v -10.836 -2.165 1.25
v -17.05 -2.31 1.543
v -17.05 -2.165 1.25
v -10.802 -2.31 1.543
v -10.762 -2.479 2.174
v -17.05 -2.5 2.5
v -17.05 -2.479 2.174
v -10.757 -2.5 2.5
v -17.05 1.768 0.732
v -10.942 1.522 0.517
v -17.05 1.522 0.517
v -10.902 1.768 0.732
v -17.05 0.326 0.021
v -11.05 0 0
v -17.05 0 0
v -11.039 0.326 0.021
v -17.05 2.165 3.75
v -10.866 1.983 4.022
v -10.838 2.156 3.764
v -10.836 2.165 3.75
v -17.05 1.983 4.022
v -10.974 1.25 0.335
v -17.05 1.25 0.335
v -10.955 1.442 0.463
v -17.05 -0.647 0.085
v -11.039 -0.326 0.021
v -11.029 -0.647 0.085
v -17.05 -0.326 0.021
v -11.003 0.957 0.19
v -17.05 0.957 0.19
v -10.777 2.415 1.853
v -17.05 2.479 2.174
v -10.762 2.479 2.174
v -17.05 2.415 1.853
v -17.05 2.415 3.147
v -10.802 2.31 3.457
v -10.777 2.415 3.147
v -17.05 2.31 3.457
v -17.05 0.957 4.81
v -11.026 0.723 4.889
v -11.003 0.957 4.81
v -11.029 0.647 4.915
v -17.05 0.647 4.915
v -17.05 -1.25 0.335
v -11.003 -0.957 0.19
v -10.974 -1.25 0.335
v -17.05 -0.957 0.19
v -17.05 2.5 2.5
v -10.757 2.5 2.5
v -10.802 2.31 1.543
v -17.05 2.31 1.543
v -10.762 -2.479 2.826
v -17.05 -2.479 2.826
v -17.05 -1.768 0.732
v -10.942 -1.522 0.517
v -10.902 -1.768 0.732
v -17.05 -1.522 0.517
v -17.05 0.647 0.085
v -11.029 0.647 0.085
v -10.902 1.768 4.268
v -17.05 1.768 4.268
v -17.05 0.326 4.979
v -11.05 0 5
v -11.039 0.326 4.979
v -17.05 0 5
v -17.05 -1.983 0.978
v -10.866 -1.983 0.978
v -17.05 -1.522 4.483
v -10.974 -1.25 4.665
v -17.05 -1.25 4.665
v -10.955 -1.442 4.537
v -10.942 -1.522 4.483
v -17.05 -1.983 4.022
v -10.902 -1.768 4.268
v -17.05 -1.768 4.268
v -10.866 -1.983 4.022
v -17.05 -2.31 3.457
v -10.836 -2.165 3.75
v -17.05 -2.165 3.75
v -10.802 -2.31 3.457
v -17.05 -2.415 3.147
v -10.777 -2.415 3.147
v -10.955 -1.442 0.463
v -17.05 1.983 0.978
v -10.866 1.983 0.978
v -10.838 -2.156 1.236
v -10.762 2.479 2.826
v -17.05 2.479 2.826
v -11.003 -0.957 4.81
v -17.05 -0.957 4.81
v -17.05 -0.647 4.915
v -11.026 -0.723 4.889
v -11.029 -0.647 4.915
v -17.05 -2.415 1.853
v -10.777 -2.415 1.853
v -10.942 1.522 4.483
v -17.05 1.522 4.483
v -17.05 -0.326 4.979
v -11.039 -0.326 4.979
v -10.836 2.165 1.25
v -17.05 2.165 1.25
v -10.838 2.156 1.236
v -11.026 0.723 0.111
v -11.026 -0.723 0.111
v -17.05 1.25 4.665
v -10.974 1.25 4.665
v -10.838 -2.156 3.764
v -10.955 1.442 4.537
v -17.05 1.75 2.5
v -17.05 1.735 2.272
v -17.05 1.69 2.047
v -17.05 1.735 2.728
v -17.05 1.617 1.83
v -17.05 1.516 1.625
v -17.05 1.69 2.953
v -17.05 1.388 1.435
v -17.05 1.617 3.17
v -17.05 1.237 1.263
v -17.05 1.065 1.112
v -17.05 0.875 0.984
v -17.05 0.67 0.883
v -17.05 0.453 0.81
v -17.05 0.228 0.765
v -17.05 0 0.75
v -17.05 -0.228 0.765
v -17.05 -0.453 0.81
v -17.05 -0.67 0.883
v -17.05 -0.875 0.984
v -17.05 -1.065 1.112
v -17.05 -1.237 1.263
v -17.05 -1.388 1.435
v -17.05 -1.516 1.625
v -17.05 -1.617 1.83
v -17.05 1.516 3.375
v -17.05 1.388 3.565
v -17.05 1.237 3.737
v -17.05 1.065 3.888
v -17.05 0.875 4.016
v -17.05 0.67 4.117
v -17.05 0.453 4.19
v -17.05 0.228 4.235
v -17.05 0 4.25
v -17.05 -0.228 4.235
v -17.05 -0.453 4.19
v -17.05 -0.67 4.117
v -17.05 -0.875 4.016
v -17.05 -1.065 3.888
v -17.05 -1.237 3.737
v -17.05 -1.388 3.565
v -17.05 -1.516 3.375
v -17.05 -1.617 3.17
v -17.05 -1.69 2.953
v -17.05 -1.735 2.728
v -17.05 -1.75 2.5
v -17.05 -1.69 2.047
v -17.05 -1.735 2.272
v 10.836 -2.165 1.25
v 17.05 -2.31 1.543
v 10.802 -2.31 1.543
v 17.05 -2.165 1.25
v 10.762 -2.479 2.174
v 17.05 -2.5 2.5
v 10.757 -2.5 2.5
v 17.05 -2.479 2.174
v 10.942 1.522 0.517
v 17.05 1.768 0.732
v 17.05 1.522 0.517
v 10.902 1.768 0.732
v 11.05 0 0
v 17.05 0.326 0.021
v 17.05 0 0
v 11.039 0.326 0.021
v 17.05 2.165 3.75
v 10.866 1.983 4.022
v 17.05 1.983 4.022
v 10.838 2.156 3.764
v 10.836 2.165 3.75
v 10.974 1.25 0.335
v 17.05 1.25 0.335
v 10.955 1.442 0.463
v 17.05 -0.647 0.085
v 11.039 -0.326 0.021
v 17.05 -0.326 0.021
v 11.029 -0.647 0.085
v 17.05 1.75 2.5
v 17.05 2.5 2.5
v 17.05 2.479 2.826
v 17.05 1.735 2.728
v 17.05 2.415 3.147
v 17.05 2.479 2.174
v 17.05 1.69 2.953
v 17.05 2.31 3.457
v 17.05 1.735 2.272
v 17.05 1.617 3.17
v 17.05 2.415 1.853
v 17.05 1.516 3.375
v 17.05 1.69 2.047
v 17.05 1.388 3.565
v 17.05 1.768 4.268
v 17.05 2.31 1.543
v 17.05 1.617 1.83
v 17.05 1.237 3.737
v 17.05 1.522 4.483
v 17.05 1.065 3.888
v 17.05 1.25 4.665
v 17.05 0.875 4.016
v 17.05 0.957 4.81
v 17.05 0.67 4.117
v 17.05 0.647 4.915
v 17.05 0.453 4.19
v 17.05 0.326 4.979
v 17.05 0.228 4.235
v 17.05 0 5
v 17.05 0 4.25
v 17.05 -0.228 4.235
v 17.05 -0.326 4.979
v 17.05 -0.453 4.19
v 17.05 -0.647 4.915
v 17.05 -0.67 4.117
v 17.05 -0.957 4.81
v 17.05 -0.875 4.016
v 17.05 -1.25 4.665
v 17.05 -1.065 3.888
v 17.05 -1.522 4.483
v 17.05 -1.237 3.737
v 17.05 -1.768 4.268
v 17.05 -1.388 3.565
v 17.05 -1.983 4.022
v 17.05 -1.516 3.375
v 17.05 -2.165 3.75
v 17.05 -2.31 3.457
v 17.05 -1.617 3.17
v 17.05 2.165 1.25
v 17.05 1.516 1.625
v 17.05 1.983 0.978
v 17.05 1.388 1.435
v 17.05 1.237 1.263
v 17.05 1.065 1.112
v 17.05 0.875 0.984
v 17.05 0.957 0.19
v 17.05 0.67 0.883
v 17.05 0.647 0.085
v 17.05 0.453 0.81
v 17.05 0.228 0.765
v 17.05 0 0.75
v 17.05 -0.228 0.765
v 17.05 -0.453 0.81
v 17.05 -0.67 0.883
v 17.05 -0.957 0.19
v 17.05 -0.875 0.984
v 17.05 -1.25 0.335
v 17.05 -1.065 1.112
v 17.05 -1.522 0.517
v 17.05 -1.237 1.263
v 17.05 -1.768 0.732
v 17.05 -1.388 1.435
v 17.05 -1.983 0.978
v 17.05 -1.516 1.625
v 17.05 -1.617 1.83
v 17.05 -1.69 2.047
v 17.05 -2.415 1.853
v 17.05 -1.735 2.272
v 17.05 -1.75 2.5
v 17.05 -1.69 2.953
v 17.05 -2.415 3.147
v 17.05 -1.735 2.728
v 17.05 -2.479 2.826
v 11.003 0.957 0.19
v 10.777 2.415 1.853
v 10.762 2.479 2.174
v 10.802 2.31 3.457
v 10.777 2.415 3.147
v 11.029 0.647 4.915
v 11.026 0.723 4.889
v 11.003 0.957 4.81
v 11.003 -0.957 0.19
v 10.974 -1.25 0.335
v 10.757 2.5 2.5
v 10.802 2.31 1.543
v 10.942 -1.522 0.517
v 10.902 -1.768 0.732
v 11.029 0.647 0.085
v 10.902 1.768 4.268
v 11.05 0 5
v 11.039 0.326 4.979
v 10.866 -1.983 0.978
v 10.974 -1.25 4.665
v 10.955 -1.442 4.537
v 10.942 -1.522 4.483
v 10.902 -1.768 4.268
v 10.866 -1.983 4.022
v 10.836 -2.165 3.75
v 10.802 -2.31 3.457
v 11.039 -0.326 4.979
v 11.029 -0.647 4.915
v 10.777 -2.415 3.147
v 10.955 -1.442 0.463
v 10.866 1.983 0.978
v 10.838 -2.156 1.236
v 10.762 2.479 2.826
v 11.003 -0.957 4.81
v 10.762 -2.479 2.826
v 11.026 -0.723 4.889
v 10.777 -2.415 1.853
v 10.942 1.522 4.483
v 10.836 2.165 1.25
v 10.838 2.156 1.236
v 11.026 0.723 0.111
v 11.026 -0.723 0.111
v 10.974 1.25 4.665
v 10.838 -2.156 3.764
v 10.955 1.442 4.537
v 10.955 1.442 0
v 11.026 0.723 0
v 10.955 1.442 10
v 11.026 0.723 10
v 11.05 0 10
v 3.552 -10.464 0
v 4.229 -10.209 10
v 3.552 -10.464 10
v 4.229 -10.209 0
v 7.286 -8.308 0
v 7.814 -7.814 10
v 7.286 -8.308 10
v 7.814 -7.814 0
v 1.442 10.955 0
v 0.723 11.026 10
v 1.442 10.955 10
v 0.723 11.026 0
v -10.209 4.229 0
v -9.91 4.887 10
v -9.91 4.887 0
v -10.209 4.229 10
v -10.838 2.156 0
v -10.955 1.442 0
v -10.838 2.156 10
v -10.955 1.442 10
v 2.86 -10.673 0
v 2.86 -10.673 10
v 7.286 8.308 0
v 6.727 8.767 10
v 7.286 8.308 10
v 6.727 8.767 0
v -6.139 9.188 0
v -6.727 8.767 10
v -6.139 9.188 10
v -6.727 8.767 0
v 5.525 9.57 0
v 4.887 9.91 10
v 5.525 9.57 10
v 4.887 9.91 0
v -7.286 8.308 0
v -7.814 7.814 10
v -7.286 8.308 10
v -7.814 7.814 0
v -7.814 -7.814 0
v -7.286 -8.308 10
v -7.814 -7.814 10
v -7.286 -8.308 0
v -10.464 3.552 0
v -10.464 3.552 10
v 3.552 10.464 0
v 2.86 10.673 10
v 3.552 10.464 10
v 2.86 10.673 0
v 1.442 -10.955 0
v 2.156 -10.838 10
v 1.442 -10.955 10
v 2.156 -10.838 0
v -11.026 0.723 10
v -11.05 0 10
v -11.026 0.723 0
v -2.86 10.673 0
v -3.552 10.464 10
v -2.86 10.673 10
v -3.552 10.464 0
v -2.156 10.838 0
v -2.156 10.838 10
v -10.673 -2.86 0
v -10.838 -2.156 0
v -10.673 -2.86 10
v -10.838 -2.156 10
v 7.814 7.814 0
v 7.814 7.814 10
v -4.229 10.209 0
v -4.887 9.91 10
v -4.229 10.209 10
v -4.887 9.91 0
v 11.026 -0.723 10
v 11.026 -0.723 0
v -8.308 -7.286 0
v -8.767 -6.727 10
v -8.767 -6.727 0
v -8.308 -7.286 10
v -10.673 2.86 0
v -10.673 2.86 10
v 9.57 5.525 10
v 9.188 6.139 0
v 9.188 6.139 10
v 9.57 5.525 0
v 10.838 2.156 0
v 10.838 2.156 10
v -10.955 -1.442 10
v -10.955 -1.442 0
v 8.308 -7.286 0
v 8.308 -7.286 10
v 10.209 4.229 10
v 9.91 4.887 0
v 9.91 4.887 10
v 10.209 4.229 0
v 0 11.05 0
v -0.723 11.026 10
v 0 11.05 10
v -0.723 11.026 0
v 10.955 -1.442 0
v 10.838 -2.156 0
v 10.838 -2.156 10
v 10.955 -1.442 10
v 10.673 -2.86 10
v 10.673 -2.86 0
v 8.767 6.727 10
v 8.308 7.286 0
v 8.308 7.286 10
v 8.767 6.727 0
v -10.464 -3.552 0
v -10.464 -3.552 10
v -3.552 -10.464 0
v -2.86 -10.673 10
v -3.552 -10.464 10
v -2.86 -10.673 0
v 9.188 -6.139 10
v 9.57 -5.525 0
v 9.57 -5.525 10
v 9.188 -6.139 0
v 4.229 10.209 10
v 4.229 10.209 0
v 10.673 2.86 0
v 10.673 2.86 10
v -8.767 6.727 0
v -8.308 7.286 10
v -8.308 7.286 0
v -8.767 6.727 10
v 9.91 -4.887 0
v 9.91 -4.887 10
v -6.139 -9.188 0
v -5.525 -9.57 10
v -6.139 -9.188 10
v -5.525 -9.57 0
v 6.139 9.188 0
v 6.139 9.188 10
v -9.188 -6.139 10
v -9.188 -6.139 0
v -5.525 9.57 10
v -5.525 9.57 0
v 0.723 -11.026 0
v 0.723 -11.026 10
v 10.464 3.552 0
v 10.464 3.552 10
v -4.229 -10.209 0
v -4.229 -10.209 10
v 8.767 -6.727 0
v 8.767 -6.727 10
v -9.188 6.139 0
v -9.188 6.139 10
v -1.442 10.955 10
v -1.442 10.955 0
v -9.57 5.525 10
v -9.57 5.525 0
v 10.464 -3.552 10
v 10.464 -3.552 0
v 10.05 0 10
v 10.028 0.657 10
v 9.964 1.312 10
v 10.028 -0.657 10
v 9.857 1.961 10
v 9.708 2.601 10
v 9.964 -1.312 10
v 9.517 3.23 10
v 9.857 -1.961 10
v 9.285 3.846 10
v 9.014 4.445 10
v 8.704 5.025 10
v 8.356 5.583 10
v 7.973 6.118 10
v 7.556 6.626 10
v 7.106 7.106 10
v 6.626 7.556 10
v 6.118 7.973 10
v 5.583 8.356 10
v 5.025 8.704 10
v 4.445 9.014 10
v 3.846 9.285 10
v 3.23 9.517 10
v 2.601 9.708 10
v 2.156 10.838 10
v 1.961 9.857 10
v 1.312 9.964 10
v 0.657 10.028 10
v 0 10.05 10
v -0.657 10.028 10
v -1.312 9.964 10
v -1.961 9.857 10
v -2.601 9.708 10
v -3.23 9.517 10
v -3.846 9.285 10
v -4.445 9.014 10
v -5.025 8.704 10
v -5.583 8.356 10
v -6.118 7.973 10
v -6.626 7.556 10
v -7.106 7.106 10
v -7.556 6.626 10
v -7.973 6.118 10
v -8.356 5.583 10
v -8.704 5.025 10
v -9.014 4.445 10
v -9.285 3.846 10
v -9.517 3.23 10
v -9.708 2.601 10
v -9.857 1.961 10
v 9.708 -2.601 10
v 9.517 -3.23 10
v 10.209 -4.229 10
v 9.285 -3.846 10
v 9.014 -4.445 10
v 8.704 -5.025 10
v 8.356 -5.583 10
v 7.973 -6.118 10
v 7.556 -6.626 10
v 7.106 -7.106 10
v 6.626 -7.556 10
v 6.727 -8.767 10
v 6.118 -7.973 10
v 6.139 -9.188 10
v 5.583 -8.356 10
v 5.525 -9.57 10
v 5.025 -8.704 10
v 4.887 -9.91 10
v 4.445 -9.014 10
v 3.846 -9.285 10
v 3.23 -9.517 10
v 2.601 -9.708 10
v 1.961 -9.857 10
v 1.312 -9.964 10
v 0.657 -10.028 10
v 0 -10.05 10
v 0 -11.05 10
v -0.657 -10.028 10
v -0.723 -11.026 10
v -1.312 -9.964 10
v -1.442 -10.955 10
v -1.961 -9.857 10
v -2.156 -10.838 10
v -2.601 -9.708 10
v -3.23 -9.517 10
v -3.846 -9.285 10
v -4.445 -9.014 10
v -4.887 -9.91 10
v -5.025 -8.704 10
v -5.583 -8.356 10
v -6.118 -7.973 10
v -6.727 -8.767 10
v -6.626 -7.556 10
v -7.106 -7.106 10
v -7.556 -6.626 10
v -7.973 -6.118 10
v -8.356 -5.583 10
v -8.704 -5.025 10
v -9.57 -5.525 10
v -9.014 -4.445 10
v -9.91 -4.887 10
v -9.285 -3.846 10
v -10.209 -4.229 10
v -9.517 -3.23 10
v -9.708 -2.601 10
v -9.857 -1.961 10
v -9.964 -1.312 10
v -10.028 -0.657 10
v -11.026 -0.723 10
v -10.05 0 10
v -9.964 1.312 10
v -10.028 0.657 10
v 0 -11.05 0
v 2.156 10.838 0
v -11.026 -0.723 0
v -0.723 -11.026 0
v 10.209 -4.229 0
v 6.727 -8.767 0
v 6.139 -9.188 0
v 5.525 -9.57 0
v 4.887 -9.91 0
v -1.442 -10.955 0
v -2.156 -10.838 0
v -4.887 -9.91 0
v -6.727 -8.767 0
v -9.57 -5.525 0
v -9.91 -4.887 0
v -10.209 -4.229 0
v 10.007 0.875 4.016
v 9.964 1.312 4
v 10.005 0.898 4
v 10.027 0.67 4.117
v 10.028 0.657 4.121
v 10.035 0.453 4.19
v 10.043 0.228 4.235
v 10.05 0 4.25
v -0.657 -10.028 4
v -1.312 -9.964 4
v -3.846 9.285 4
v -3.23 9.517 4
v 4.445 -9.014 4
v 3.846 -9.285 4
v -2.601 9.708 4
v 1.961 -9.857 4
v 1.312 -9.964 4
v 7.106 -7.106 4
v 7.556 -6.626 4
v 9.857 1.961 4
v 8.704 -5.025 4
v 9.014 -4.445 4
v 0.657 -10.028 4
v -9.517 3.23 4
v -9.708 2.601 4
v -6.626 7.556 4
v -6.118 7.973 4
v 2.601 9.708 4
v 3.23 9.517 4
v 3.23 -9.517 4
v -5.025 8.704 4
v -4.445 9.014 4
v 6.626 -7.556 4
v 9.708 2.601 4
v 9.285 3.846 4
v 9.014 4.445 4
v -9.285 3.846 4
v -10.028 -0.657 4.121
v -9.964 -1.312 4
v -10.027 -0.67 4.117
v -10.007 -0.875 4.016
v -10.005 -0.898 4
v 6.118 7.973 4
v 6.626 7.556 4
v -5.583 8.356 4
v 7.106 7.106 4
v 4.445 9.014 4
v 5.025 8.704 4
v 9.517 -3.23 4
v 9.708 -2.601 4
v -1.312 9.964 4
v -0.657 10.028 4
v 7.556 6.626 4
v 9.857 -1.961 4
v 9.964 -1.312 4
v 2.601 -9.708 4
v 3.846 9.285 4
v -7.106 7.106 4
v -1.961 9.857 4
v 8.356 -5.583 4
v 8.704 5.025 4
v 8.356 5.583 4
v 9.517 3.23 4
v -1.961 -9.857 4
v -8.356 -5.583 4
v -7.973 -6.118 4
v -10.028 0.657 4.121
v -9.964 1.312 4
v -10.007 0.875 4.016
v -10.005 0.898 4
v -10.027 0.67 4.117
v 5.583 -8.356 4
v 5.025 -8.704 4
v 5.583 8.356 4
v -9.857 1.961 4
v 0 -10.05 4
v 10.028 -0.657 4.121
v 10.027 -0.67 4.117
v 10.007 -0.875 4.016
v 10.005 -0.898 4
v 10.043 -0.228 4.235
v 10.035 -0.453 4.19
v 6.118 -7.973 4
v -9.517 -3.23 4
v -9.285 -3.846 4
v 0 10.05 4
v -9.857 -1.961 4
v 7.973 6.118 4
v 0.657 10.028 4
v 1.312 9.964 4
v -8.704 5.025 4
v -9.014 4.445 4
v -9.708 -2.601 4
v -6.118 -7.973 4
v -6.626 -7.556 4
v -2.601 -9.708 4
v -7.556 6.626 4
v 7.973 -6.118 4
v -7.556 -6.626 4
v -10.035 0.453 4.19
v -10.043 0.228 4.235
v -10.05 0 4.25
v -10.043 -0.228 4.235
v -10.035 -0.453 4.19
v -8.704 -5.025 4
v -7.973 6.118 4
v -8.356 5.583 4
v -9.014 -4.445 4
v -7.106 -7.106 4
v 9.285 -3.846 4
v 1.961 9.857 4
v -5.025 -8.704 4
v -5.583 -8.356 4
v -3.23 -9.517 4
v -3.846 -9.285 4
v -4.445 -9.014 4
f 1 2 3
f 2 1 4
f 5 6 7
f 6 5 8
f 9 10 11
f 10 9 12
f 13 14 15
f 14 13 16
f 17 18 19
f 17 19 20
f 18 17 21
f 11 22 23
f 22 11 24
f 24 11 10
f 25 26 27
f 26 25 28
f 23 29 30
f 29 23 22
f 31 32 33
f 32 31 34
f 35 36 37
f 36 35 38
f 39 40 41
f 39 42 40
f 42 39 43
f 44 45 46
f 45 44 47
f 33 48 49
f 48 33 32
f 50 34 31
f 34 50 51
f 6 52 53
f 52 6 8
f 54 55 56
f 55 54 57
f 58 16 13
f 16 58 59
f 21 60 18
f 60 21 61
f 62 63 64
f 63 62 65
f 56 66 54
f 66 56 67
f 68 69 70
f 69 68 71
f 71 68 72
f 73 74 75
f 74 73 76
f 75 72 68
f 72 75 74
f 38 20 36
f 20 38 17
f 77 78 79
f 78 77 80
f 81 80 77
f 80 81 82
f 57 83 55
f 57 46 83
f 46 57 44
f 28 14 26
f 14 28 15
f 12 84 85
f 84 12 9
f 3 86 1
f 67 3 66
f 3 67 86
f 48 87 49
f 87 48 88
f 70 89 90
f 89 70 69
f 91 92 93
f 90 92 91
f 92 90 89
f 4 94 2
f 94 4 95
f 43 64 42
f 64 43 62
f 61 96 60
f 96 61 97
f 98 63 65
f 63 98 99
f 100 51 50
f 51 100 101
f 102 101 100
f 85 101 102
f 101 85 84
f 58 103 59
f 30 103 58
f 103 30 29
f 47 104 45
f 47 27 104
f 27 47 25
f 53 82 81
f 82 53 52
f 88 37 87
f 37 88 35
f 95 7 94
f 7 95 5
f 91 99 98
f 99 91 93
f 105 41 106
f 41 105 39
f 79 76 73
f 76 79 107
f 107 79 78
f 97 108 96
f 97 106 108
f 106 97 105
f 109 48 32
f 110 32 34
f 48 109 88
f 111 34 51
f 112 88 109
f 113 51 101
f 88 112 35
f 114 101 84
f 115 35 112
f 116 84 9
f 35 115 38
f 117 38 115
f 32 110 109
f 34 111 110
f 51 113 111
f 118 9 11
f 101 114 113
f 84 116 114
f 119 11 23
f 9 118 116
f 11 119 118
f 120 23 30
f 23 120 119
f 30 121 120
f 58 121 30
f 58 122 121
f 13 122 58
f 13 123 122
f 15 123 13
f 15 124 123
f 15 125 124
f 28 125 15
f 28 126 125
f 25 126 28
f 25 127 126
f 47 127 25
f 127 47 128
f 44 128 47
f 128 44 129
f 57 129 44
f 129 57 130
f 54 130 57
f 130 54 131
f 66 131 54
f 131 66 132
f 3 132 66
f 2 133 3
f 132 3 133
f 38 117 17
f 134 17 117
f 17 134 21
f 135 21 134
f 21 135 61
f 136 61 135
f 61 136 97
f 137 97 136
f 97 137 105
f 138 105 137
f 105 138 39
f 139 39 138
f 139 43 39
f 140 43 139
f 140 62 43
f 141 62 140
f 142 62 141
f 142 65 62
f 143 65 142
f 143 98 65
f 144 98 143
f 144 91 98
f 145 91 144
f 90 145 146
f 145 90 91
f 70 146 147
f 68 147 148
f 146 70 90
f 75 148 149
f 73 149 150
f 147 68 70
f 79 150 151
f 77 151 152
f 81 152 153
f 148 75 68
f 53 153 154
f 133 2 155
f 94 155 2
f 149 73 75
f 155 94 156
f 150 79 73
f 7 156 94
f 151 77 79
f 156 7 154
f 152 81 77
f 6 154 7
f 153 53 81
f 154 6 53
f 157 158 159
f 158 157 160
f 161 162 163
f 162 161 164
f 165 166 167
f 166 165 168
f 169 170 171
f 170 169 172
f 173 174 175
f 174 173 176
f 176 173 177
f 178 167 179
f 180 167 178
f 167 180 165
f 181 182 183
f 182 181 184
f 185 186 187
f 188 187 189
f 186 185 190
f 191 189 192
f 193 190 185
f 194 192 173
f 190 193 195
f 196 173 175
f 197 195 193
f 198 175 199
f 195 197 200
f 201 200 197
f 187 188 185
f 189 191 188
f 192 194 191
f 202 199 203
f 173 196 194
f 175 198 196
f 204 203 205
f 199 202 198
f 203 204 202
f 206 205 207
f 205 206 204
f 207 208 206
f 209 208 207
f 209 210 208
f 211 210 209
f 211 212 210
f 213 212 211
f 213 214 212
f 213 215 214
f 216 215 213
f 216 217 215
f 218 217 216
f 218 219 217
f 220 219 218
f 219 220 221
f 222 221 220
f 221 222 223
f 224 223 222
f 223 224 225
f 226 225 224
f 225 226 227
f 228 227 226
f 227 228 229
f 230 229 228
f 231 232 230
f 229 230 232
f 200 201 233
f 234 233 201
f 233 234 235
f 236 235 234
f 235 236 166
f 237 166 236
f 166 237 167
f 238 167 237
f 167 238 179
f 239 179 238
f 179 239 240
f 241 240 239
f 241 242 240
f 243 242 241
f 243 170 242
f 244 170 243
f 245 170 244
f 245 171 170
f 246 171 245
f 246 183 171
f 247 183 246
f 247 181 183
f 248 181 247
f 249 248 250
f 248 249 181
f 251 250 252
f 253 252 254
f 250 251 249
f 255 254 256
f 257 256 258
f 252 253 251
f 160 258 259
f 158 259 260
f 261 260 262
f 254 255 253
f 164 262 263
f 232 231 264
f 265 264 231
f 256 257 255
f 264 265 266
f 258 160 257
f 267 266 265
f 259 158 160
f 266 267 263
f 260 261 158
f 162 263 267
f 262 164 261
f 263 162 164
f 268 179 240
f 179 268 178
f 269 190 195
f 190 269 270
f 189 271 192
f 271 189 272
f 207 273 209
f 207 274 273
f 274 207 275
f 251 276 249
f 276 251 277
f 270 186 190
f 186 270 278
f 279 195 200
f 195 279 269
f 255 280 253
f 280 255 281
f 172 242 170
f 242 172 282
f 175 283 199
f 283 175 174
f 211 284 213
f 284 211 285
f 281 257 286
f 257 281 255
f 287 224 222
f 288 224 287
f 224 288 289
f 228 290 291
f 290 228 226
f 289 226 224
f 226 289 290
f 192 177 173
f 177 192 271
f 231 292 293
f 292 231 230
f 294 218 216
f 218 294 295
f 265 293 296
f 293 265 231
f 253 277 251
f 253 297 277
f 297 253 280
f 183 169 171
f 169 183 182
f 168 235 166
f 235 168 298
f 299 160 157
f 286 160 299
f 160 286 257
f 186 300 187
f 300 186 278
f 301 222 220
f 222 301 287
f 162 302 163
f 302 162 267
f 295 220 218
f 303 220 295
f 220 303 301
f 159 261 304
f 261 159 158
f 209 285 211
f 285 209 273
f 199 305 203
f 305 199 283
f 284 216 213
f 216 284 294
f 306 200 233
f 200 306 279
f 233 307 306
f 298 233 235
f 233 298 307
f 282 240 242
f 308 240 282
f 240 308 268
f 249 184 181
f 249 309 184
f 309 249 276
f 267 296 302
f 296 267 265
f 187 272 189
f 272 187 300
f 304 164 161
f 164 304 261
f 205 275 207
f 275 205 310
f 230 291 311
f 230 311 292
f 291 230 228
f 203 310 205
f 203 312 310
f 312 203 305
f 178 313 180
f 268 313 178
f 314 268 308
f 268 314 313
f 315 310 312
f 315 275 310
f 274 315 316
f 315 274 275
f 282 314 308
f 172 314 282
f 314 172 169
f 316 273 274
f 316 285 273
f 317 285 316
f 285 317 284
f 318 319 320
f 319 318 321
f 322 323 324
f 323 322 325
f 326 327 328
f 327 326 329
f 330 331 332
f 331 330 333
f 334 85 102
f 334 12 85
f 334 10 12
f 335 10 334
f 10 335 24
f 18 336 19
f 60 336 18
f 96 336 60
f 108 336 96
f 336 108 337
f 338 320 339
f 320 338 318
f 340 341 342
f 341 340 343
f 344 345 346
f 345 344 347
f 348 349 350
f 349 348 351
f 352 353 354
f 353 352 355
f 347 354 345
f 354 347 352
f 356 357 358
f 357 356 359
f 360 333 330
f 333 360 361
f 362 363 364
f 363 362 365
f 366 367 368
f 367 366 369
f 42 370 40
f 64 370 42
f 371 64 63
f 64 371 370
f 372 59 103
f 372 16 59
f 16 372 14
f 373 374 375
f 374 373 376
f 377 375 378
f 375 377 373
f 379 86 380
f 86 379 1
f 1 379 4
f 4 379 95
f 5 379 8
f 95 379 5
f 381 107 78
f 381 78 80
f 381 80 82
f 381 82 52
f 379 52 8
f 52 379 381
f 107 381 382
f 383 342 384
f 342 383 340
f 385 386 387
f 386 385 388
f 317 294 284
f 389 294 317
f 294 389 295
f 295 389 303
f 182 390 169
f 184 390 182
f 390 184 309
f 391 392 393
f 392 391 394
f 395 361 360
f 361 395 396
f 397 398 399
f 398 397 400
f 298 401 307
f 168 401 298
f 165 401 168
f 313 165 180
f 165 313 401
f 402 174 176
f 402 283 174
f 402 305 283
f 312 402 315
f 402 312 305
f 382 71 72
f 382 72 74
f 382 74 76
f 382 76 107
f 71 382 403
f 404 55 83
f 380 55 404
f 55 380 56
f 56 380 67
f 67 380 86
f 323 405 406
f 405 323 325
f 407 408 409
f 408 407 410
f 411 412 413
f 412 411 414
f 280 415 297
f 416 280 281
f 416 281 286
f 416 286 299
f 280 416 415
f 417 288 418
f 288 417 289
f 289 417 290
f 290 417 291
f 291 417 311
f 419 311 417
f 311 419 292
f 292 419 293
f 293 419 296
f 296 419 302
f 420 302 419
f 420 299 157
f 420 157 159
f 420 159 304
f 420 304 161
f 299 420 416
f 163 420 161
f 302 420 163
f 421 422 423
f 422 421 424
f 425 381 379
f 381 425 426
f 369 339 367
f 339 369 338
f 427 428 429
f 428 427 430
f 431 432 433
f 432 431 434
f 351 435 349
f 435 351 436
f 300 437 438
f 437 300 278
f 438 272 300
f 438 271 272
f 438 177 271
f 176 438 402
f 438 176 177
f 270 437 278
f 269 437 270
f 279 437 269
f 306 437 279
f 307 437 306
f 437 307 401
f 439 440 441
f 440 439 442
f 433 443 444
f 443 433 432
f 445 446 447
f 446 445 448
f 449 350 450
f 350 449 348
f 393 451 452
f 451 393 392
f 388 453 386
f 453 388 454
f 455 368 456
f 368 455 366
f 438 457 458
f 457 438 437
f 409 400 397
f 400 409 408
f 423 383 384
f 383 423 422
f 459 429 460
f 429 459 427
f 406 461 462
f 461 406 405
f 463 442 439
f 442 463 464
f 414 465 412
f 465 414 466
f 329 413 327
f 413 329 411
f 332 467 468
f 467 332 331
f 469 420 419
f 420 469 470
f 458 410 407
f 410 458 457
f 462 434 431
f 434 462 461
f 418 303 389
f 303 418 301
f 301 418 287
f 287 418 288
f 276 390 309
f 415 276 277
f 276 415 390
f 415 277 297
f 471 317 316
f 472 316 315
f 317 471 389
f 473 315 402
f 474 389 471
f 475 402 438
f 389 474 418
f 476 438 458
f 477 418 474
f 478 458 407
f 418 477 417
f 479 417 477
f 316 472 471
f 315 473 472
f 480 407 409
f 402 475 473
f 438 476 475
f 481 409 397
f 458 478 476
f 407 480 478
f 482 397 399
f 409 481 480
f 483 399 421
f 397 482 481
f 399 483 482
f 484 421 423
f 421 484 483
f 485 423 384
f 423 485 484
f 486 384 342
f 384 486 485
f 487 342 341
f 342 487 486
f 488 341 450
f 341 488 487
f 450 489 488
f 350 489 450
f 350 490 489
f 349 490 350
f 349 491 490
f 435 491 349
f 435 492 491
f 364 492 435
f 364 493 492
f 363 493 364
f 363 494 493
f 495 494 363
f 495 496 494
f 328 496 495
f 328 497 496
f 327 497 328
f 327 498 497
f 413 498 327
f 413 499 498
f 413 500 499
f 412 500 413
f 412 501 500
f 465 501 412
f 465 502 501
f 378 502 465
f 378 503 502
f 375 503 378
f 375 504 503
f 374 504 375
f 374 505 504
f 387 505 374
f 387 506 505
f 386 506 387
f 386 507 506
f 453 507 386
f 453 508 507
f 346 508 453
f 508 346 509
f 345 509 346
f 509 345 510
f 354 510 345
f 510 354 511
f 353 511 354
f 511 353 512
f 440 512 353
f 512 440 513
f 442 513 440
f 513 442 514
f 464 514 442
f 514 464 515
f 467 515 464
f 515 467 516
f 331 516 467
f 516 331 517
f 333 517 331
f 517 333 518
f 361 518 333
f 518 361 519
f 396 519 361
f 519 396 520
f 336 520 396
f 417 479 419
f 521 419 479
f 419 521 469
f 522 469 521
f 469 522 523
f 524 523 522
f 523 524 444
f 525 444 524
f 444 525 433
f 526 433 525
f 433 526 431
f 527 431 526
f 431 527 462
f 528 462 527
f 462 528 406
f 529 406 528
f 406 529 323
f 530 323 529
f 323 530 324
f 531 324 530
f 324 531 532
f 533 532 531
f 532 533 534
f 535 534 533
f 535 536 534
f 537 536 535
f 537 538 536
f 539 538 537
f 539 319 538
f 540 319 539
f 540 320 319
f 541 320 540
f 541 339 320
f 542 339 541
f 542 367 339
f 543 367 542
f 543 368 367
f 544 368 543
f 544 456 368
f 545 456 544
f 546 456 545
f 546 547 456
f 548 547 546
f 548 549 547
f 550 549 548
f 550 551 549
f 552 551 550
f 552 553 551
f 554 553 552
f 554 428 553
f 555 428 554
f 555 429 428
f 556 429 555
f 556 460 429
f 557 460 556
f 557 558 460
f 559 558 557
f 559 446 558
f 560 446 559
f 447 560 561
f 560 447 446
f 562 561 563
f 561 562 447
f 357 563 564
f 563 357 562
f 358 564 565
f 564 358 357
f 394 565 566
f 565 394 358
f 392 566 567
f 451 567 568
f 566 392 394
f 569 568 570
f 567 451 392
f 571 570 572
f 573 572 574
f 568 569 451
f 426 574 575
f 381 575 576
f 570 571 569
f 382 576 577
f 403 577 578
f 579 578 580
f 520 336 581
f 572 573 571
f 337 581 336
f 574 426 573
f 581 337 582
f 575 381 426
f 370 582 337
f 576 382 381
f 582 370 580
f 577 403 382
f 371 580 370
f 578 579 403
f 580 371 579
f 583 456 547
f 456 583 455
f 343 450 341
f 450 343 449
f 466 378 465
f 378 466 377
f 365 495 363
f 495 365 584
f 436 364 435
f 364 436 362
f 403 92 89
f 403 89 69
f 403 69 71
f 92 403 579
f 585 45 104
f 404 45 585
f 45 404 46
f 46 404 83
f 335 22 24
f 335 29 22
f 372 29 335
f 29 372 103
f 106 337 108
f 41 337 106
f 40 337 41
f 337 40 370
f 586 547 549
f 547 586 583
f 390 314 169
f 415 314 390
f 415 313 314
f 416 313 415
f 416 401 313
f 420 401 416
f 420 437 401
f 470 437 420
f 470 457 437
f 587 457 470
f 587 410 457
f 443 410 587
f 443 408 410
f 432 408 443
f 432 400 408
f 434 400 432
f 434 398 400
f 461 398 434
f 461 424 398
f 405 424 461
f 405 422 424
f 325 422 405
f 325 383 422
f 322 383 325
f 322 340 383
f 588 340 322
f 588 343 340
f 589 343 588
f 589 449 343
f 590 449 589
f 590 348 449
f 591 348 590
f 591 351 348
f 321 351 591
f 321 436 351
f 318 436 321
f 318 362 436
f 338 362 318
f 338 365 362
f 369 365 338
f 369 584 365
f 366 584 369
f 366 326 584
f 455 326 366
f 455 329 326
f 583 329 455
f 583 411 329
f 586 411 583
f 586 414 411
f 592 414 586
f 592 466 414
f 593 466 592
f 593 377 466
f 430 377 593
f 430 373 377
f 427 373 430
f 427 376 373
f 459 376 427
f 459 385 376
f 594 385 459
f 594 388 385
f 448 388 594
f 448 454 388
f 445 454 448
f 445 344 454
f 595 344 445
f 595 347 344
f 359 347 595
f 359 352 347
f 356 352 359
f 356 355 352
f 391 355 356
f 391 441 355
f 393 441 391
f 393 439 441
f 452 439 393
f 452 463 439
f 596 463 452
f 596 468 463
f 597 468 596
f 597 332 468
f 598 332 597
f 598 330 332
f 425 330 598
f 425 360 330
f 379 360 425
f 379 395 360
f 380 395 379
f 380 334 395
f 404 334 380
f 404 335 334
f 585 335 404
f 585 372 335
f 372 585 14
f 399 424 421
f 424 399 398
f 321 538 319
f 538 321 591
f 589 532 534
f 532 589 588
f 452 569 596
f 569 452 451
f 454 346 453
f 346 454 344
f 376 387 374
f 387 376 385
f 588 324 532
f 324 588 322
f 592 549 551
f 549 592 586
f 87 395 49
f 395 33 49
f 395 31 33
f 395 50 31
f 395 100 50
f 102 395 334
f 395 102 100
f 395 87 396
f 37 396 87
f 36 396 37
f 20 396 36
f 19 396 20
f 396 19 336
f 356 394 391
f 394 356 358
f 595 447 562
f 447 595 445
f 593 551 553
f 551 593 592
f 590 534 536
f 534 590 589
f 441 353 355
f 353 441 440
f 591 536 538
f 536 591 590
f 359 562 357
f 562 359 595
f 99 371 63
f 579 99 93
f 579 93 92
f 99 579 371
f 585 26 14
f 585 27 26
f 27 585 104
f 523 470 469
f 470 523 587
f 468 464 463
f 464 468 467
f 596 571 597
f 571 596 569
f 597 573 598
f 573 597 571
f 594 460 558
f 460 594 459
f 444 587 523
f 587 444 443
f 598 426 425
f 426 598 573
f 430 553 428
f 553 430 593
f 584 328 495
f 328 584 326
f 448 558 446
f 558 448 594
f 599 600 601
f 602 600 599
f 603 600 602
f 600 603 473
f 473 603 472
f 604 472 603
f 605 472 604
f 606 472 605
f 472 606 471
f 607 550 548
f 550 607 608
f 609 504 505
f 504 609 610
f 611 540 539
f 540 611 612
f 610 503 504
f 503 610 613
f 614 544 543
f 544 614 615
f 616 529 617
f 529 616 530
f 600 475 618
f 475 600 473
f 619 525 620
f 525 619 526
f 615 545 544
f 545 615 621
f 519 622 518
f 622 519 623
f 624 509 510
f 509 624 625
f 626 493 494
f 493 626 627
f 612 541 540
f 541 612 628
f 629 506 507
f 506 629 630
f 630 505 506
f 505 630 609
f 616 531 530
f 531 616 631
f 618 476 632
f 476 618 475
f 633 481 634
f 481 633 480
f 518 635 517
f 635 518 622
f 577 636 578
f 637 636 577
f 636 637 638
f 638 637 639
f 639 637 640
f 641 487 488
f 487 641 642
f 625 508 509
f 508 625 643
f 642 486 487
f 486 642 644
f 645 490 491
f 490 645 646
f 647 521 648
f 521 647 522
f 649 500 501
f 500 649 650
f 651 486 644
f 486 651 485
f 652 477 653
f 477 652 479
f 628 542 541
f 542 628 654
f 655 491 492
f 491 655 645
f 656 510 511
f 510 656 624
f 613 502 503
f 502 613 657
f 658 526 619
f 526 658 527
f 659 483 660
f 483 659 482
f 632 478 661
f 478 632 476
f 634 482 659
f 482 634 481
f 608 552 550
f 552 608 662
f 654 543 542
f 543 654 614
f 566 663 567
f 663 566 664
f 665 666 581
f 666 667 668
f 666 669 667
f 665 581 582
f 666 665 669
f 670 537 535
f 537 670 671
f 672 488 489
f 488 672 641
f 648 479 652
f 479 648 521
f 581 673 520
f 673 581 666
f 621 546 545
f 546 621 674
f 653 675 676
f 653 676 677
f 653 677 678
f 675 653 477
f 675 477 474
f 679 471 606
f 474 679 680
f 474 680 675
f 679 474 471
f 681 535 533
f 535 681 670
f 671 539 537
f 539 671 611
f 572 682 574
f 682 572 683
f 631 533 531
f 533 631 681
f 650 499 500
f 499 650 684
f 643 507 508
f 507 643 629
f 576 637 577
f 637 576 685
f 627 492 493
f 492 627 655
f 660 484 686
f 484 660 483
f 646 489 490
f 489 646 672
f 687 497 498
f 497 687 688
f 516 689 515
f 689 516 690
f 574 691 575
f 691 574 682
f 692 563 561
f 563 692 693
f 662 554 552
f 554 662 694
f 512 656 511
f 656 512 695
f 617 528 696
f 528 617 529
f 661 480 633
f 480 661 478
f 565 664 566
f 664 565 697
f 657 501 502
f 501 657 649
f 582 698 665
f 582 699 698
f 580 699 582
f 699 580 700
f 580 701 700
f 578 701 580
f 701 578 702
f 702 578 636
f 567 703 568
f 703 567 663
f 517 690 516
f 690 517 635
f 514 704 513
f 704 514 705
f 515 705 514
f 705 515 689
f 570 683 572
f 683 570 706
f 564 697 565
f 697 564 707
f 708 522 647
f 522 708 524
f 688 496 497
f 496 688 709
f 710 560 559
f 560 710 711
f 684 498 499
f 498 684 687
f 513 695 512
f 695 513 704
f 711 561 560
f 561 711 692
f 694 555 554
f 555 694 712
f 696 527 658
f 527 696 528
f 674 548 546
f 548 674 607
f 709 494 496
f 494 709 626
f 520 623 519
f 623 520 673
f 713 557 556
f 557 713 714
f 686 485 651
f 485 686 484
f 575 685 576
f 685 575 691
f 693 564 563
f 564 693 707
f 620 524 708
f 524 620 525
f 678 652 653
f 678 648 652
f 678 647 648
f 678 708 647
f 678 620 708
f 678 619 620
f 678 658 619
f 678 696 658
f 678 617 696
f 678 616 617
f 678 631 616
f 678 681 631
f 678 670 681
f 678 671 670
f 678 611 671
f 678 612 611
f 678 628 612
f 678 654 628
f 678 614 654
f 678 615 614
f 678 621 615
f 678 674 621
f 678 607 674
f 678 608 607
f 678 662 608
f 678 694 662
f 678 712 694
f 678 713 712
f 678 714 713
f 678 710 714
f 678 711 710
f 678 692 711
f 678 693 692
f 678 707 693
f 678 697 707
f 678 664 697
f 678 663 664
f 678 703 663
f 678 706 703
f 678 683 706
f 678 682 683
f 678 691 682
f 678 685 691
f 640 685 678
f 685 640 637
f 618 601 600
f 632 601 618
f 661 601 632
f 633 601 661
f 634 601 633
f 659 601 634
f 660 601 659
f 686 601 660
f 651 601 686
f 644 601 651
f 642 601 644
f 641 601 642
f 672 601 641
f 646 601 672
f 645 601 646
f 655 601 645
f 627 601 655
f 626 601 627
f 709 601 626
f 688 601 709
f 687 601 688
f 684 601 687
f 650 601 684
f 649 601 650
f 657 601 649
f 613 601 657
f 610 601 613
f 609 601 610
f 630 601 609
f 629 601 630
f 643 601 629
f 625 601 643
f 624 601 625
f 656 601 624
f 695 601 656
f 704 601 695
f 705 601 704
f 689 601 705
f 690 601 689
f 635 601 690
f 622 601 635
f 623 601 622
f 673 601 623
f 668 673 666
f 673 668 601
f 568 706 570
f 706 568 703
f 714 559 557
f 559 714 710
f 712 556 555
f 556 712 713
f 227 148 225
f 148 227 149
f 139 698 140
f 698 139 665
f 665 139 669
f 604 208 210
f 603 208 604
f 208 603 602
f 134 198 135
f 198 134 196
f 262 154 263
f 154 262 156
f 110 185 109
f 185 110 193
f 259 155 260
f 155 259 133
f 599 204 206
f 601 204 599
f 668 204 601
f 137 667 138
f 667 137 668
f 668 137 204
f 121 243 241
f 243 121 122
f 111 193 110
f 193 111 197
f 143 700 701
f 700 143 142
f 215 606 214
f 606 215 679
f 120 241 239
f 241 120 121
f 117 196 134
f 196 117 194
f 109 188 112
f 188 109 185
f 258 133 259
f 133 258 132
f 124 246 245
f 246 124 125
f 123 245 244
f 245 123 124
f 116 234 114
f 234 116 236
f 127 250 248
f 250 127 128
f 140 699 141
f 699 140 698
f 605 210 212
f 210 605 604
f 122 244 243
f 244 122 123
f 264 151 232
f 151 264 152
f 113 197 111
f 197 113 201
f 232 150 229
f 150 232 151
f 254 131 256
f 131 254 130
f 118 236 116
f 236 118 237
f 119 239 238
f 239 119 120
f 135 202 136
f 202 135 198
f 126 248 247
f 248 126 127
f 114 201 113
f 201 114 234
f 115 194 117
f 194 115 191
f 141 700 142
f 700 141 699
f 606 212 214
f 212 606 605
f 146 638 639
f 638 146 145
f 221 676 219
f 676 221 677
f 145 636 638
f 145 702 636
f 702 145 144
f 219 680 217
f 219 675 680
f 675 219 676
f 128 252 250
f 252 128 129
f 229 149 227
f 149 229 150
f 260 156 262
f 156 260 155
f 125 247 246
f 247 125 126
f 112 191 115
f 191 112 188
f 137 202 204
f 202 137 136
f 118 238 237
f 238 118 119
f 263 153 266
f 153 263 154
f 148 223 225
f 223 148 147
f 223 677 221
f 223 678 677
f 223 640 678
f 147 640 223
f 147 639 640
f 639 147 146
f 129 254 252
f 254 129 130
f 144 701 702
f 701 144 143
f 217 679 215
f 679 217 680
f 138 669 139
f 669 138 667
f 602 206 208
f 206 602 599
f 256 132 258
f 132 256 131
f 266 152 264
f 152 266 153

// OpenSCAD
// CO sensor cup with opposed side spigots for flexible inlet and outlet tubes.
// Replace the provisional sensor diameter with the measured sensor body diameter.
co_sensor_diameter = 20; // Sensor body diameter
sensor_clearance = 0.05; // Radial extra clearance around the sensor body if needed

holder_height = 10; // Overall cup height.
holder_wall = 1; // Radial wall thickness around the sensor.
closed_end_thickness = 4; // Thickness of the closed end that stops the sensor.

// Smooth spigots are sized for flexible tubing; adjust to the tube's inside diameter.
tube_bore_diameter = 3.5; // Inside diameter of both gas ports and spigots.
tube_spigot_diameter = 5; // Outside diameter of the tube-attachment spigots.
tube_spigot_length = 6; // Length of each tube spigot outside the cup.
spigot_overlap = 0.6; // Amount each spigot overlaps the cup wall for a strong union.
gas_passage_overlap = 0.25; // How far the round passage rises above the closed-end surface.

sensor_cavity_diameter = co_sensor_diameter + 2 * sensor_clearance; // Derived sensor-cavity diameter.
holder_outer_diameter = sensor_cavity_diameter + 2 * holder_wall; // Derived cup outside diameter.
port_center_z = closed_end_thickness - tube_bore_diameter / 2 + gas_passage_overlap; // Height of tube bores above the floor.

module co_sensor_holder() {
    difference() {
        union() {
            cylinder(h = holder_height, d = holder_outer_diameter, $fn = 96);

            // Opposed hollow spigots open into the cup just above its closed end.
            for (side = [-1, 1])
                translate([side * (holder_outer_diameter / 2 + tube_spigot_length / 2 - spigot_overlap / 2),
                           0, port_center_z])
                    rotate([0, 90, 0])
                        cylinder(h = tube_spigot_length + spigot_overlap,
                                 d = tube_spigot_diameter, center = true, $fn = 48);
        }

        // Sensor inserts through the top; the bottom thickness remains closed.
        translate([0, 0, closed_end_thickness])
            cylinder(h = holder_height - closed_end_thickness + 0.1,
                     d = sensor_cavity_diameter, $fn = 96);

                // One continuous round passage connects both spigots beneath the seated sensor.
        translate([0, 0, port_center_z])
            rotate([0, 90, 0])
                cylinder(h = holder_outer_diameter + 2 * tube_spigot_length + 1,
                         d = tube_bore_diameter, center = true, $fn = 48);
    }
}

co_sensor_holder();
